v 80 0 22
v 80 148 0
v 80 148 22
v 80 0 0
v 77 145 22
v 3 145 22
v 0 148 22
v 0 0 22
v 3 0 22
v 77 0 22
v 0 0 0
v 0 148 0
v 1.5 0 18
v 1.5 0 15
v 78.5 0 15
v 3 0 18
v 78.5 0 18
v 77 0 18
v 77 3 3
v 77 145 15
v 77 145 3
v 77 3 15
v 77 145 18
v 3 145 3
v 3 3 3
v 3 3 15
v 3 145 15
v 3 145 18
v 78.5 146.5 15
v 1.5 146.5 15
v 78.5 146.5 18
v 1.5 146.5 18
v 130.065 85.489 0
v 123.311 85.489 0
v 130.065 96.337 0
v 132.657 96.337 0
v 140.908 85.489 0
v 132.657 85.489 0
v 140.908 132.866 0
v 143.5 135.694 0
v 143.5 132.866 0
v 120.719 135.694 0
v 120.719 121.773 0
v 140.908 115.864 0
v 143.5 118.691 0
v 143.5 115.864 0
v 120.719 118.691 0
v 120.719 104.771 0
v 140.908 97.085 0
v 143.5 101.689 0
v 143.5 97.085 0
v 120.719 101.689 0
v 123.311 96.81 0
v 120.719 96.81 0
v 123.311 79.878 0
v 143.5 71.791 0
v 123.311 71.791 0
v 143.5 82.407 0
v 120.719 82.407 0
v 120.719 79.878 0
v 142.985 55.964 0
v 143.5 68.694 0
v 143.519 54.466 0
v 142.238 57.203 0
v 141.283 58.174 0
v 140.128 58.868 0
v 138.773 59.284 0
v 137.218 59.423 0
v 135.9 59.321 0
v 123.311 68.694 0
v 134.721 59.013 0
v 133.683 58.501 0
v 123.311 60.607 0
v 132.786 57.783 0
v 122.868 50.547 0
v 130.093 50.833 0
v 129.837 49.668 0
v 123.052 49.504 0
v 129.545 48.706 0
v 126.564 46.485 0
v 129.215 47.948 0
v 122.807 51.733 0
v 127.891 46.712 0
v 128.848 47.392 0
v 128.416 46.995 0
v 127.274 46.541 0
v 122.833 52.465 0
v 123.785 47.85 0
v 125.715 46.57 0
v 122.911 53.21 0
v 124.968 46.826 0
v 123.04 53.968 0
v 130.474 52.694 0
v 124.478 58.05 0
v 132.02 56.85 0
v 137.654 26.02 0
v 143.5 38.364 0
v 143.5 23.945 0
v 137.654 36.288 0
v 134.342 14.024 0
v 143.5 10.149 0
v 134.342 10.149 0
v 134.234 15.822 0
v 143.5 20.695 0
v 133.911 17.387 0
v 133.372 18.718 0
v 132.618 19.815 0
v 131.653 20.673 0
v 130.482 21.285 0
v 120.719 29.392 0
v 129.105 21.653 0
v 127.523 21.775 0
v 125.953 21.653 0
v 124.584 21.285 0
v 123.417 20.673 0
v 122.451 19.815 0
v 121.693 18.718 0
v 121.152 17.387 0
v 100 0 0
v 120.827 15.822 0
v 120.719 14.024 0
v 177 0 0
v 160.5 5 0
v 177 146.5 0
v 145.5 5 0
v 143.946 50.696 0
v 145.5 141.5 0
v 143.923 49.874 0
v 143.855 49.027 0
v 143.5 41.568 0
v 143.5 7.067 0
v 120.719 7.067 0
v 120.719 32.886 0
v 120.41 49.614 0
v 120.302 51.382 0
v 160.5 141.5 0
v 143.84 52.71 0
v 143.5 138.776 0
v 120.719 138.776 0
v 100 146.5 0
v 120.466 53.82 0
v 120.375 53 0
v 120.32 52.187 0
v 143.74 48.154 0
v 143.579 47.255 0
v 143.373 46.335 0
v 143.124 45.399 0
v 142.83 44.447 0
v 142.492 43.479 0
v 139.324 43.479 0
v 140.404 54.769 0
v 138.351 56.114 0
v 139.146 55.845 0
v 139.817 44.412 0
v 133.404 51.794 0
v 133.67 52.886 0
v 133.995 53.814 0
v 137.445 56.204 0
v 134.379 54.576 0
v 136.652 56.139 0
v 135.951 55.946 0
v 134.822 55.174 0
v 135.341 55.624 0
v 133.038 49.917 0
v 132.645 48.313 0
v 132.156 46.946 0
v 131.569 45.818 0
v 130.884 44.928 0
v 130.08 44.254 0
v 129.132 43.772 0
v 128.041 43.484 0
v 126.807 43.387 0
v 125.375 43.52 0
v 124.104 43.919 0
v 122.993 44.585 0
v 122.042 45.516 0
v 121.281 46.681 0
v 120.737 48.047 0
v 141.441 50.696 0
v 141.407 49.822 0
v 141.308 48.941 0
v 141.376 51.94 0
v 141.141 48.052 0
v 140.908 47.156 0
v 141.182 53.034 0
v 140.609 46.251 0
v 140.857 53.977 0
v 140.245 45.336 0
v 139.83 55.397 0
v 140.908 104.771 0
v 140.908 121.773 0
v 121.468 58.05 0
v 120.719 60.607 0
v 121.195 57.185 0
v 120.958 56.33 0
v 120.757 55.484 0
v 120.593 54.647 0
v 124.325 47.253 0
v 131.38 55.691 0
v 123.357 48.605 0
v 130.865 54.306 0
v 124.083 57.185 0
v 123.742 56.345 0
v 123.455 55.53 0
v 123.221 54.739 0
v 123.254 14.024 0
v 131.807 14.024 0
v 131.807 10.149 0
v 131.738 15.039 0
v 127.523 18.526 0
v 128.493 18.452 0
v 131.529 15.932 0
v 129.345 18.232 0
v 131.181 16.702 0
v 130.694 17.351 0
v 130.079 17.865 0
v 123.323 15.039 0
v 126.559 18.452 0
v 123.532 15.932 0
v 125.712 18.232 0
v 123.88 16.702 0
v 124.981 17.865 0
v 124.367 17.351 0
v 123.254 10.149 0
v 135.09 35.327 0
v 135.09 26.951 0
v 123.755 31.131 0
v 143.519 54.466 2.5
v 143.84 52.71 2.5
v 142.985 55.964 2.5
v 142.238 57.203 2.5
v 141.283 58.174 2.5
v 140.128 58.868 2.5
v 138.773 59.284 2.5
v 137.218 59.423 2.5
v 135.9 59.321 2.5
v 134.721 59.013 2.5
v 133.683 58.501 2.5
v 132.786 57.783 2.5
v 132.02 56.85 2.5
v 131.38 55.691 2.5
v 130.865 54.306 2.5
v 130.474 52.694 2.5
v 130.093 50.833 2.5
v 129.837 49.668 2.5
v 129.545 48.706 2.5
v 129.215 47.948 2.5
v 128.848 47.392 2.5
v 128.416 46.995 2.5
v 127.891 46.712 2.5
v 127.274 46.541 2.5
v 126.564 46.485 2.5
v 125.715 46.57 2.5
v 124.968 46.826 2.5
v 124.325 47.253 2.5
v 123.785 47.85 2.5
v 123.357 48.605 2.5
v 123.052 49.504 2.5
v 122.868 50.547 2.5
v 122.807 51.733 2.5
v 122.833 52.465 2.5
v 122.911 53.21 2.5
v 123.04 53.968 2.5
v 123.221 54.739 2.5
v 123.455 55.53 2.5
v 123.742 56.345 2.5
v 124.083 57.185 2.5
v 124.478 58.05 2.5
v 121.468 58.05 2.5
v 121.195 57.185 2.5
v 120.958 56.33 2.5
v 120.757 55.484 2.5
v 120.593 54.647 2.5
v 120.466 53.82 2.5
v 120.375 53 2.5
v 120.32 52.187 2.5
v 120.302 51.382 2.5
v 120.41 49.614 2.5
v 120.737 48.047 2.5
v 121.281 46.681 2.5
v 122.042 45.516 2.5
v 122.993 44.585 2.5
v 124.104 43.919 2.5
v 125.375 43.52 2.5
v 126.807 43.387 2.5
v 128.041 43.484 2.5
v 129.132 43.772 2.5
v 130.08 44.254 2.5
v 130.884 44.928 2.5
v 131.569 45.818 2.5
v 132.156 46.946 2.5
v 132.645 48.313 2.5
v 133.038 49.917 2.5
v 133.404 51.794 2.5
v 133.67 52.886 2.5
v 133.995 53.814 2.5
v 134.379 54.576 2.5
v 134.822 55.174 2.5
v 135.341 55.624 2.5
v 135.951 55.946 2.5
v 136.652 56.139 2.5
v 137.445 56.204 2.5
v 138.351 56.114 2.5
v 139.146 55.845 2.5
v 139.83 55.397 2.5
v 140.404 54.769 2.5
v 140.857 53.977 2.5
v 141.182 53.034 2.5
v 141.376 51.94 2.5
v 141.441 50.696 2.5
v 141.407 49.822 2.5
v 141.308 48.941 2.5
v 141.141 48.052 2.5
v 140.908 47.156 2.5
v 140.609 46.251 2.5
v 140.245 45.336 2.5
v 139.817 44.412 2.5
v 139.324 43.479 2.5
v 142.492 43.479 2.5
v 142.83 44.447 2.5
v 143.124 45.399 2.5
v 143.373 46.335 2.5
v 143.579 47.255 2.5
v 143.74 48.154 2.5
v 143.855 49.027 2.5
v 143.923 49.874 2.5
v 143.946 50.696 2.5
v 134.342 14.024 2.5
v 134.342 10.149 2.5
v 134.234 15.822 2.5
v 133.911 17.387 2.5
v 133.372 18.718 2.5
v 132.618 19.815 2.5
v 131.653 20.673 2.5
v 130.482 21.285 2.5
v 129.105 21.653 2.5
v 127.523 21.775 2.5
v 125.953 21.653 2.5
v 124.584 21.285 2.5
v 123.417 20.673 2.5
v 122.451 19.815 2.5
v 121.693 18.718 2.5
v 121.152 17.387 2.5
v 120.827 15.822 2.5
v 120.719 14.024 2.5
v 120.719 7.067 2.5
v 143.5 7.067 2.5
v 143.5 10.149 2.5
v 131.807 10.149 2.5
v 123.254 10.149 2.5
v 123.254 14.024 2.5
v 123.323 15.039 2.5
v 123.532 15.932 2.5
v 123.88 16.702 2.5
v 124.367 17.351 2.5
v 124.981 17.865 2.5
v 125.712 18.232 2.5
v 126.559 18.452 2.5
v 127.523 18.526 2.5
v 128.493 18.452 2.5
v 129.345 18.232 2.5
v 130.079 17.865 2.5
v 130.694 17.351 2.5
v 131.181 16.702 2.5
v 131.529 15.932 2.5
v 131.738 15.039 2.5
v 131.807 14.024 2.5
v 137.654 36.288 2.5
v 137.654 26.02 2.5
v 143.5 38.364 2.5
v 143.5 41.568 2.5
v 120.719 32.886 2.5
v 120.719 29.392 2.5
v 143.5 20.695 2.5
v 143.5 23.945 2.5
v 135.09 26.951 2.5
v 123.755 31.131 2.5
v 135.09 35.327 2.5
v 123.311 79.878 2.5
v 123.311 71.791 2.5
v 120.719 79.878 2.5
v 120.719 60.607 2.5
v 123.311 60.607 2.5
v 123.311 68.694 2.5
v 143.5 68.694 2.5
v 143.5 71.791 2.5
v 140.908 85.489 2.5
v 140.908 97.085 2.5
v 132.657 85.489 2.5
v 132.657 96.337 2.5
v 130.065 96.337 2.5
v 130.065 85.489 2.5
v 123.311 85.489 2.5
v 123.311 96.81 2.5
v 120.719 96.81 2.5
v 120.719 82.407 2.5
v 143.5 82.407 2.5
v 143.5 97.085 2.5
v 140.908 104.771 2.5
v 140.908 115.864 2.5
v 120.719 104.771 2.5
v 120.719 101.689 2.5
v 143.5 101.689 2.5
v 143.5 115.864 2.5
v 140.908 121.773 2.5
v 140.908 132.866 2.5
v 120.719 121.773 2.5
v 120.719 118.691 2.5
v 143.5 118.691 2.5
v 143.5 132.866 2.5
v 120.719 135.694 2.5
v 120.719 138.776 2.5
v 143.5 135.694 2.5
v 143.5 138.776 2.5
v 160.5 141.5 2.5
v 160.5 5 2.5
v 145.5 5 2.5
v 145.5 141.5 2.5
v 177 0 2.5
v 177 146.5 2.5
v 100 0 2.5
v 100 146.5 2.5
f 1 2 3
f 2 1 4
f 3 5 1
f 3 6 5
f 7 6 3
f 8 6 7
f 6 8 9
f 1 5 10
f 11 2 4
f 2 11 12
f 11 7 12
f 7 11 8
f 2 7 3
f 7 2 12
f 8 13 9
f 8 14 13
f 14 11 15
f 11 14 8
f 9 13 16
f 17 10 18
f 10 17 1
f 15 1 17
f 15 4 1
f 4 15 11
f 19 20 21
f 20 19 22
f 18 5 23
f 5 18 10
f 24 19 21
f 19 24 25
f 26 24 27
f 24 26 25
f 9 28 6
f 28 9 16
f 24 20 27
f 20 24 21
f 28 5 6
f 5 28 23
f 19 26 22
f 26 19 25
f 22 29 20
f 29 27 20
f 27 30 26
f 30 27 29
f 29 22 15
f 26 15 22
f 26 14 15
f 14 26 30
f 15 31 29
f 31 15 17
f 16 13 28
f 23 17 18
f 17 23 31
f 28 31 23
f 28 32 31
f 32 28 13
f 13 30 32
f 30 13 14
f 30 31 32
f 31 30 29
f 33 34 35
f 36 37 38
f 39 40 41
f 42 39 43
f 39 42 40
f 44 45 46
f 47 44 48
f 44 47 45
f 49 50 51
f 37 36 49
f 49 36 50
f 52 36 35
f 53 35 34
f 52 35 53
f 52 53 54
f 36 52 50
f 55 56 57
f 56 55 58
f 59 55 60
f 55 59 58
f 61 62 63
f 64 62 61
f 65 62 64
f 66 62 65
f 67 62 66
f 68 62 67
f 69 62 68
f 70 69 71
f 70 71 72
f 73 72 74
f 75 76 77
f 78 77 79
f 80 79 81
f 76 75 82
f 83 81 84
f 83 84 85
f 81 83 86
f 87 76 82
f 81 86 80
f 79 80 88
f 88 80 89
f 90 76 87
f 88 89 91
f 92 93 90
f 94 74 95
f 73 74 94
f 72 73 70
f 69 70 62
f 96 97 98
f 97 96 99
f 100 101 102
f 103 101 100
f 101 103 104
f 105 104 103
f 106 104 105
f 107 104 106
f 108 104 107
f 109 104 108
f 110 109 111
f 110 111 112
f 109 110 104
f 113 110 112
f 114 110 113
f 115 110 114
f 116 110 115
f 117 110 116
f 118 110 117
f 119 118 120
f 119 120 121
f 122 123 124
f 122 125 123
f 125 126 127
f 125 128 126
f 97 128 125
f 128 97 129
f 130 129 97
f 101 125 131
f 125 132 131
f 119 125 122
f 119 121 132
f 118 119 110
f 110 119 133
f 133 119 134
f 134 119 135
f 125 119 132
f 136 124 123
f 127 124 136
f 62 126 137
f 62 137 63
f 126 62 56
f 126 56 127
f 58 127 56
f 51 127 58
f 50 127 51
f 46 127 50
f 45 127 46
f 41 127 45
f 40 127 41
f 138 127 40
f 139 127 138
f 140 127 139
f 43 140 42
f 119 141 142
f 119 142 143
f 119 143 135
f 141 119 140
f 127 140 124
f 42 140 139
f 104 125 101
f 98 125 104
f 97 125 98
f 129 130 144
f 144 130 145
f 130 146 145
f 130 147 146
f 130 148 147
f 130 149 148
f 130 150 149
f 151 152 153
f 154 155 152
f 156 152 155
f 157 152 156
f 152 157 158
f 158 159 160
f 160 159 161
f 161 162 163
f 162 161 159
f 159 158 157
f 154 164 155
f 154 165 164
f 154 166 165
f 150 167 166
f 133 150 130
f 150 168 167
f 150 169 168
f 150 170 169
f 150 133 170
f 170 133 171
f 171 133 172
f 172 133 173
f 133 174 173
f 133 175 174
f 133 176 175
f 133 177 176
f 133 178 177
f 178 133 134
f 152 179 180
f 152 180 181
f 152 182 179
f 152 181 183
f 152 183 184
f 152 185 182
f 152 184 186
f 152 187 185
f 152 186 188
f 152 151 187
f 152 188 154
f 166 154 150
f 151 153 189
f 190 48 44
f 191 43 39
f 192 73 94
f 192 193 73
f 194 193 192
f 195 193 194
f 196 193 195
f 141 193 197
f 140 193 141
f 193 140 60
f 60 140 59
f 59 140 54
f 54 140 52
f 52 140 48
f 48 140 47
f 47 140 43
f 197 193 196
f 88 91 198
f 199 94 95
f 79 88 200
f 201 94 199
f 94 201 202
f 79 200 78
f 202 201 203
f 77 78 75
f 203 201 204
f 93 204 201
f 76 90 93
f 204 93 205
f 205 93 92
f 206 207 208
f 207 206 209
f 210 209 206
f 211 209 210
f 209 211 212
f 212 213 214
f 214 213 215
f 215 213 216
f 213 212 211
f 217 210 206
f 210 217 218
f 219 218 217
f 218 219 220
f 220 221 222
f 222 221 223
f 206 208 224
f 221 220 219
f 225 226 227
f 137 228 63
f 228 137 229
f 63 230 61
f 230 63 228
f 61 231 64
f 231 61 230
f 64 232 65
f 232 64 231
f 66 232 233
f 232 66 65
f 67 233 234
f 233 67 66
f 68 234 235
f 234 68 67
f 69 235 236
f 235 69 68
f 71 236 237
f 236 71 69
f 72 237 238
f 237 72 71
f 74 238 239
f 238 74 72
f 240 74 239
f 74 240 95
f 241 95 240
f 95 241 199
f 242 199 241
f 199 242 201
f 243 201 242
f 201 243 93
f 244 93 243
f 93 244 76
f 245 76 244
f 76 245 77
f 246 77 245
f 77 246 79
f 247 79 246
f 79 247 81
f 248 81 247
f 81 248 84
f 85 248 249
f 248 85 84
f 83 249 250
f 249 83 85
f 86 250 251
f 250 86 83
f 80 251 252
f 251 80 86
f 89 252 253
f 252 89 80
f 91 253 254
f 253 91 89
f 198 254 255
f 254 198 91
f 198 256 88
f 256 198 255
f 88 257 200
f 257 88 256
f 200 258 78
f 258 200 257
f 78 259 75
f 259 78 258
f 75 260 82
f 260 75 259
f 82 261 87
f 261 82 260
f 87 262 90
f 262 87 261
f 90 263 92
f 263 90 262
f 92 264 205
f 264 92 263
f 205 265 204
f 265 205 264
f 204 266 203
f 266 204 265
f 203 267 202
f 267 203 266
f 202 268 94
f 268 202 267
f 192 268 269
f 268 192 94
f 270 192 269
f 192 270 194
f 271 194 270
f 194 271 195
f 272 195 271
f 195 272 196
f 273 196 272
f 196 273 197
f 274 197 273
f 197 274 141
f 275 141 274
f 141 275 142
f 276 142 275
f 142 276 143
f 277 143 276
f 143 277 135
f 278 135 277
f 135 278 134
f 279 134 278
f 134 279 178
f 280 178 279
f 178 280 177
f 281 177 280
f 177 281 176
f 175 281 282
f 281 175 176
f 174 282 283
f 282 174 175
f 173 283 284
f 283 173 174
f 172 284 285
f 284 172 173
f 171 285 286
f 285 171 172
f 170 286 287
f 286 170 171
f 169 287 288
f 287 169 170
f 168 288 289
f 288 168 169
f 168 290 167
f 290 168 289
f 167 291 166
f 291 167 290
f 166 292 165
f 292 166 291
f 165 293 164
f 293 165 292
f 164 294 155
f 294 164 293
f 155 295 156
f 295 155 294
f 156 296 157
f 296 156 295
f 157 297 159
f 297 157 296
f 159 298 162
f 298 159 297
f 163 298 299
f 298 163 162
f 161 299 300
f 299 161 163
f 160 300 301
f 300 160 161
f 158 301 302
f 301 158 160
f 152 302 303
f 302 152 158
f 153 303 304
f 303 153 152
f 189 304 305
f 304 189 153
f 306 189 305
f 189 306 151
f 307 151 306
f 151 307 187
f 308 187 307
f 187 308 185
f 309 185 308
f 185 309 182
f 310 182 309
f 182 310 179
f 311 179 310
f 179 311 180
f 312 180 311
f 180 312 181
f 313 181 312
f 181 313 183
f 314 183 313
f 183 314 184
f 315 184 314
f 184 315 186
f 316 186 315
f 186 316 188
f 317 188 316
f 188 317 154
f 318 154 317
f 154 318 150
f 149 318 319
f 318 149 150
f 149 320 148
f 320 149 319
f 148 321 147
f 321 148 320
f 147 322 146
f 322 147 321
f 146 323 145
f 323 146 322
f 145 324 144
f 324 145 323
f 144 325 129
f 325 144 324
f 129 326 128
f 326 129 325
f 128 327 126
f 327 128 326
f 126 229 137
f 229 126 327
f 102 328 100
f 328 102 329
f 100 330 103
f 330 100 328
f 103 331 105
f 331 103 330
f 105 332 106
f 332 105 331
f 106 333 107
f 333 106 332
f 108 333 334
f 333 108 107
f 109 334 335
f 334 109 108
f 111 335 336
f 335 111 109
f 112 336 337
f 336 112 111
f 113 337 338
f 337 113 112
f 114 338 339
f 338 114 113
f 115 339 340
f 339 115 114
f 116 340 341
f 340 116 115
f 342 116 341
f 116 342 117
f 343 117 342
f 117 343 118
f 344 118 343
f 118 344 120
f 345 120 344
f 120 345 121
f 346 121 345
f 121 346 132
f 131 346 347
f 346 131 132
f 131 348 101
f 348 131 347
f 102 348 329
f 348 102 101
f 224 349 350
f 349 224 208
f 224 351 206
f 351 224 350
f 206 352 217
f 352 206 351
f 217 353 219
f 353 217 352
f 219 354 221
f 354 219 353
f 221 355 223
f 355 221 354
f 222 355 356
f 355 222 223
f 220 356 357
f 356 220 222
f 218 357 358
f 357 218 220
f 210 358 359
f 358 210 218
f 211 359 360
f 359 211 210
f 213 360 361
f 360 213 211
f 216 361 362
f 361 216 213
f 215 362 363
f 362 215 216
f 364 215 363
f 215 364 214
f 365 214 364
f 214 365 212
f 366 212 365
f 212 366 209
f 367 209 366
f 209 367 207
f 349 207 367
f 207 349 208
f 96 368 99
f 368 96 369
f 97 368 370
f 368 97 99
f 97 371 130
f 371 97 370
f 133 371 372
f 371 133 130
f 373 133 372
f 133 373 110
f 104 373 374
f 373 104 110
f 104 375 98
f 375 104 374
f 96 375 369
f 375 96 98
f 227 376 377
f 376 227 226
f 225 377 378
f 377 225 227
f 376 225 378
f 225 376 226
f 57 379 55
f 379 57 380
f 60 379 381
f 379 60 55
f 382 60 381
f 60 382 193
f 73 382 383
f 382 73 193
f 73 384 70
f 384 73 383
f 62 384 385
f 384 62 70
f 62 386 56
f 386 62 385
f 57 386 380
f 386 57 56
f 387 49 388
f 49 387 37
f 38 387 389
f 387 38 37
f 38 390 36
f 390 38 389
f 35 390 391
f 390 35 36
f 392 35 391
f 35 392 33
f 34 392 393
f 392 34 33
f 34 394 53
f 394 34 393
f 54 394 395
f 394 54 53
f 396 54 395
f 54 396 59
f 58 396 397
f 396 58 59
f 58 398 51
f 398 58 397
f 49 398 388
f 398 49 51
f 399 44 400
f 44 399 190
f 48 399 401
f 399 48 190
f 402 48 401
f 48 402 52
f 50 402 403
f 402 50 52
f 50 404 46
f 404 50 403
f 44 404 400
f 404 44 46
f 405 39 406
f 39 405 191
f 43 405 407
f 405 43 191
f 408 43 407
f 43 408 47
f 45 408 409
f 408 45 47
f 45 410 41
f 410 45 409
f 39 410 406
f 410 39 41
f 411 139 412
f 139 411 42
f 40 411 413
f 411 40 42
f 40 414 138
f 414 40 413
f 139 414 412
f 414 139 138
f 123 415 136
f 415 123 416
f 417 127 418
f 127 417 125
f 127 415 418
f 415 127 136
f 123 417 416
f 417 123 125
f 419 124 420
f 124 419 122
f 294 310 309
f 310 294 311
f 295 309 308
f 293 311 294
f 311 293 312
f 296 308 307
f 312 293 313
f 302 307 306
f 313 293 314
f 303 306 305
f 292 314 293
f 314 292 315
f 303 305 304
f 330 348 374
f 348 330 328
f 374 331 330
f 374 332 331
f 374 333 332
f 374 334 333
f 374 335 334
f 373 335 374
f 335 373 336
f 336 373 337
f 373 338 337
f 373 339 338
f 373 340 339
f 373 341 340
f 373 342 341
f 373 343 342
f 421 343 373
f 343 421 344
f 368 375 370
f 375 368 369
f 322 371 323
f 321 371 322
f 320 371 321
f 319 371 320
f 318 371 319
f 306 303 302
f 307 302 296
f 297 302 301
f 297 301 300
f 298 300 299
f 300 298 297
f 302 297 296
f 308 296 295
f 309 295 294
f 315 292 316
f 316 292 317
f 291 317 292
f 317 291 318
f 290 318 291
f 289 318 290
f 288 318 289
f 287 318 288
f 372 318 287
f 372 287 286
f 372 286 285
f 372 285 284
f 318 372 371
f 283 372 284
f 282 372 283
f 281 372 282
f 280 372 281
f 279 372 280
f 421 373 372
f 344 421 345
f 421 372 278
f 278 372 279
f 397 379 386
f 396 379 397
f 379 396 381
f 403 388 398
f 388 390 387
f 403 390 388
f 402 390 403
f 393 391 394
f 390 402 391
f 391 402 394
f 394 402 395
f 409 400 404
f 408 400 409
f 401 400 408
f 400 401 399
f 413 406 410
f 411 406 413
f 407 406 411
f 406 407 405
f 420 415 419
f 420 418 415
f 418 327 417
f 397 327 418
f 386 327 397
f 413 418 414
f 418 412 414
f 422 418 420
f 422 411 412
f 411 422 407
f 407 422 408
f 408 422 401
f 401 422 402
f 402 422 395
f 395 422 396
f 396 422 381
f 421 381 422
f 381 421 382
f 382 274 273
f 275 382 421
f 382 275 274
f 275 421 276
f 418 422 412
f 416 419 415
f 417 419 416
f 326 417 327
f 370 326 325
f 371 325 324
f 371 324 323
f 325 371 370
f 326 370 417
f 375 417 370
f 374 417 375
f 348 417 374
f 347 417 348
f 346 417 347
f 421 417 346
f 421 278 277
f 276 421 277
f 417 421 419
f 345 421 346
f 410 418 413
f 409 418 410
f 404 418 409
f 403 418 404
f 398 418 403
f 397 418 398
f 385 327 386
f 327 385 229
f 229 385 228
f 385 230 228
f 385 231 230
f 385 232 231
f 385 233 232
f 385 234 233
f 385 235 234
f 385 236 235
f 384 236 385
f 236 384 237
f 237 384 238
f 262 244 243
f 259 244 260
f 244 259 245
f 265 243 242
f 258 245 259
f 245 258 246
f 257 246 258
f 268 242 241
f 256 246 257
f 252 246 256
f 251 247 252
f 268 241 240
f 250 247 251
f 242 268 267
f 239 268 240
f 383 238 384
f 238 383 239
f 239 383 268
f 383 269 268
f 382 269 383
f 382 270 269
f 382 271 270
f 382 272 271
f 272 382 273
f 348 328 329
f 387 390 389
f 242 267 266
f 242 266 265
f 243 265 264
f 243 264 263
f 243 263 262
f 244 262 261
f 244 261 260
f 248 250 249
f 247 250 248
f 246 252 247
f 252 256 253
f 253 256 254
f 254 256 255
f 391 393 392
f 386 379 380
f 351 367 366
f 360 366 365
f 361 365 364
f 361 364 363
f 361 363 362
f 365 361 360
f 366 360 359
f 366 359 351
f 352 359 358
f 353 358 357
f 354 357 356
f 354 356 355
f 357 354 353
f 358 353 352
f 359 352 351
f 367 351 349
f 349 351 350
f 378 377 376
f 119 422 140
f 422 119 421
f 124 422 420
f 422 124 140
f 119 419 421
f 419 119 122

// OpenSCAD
//!OpenSCAD

/*[dimensions - dimensioni]*/

// x direction
larg = 80;
// y direction
lungh = 148;
// z direction
h = 22;

/*[thickness - spessore]*/

// faces thickness - spessore pareti
sp = 3;
// top thickness - spessore coperchio
sp_coperc = 2.5;

/*[font]*/
font_text="Roboto"; //["Roboto","Barriecito"]

difference() {
  // volume esterno astuccio - whole cube volume
  cube([larg, lungh, h], center=false);

  // vuoto interno - hole inside
  color([1,0.8,0]) {
    translate([sp, sp, sp]){
      cube([(larg - sp * 2), (lungh - sp * 2), h], center=false);
    }
  }
  // apertura frontale - frontal hole for insering top
  color([0.93,0,0]) {
   translate([sp, 0, (h - 7)]){
      cube([(larg - sp * 2), sp, 15], center=false);
    }
  }
  // spessore coperchio - top thickness
  color([1,0.8,0]) {
    translate([(sp / 2), 0, (h - 7)]){
      cube([(larg - sp), (lungh - sp / 2), (sp_coperc + 0.5)], center=false);
    }
  }
}
  // coperchio - top
color([0.2,0.8,0]) {
  difference() {
    translate([(larg + 20), 0, 0]){
      cube([(larg - sp), (lungh - sp / 2), sp_coperc], center=false);
    }
  // scritta - text
    translate([(larg + 25), 0, 0]){
      translate([((larg - sp) / 2), 4, 0]){
        rotate([0, 0, 90]){
          // size is multiplied by 0.75 because openScad font sizes are in points, not pixels
          linear_extrude( height=10, twist=0, center=false){
            text("PASTELLI", font= font_text, size = 30*0.75);
          }
        }
      }
  
  /// sottolineatura - square under text
    translate([((larg - sp) / 2+2), 5, 0]) cube([15,lungh-sp/2-10,sp]);
}
}
}
